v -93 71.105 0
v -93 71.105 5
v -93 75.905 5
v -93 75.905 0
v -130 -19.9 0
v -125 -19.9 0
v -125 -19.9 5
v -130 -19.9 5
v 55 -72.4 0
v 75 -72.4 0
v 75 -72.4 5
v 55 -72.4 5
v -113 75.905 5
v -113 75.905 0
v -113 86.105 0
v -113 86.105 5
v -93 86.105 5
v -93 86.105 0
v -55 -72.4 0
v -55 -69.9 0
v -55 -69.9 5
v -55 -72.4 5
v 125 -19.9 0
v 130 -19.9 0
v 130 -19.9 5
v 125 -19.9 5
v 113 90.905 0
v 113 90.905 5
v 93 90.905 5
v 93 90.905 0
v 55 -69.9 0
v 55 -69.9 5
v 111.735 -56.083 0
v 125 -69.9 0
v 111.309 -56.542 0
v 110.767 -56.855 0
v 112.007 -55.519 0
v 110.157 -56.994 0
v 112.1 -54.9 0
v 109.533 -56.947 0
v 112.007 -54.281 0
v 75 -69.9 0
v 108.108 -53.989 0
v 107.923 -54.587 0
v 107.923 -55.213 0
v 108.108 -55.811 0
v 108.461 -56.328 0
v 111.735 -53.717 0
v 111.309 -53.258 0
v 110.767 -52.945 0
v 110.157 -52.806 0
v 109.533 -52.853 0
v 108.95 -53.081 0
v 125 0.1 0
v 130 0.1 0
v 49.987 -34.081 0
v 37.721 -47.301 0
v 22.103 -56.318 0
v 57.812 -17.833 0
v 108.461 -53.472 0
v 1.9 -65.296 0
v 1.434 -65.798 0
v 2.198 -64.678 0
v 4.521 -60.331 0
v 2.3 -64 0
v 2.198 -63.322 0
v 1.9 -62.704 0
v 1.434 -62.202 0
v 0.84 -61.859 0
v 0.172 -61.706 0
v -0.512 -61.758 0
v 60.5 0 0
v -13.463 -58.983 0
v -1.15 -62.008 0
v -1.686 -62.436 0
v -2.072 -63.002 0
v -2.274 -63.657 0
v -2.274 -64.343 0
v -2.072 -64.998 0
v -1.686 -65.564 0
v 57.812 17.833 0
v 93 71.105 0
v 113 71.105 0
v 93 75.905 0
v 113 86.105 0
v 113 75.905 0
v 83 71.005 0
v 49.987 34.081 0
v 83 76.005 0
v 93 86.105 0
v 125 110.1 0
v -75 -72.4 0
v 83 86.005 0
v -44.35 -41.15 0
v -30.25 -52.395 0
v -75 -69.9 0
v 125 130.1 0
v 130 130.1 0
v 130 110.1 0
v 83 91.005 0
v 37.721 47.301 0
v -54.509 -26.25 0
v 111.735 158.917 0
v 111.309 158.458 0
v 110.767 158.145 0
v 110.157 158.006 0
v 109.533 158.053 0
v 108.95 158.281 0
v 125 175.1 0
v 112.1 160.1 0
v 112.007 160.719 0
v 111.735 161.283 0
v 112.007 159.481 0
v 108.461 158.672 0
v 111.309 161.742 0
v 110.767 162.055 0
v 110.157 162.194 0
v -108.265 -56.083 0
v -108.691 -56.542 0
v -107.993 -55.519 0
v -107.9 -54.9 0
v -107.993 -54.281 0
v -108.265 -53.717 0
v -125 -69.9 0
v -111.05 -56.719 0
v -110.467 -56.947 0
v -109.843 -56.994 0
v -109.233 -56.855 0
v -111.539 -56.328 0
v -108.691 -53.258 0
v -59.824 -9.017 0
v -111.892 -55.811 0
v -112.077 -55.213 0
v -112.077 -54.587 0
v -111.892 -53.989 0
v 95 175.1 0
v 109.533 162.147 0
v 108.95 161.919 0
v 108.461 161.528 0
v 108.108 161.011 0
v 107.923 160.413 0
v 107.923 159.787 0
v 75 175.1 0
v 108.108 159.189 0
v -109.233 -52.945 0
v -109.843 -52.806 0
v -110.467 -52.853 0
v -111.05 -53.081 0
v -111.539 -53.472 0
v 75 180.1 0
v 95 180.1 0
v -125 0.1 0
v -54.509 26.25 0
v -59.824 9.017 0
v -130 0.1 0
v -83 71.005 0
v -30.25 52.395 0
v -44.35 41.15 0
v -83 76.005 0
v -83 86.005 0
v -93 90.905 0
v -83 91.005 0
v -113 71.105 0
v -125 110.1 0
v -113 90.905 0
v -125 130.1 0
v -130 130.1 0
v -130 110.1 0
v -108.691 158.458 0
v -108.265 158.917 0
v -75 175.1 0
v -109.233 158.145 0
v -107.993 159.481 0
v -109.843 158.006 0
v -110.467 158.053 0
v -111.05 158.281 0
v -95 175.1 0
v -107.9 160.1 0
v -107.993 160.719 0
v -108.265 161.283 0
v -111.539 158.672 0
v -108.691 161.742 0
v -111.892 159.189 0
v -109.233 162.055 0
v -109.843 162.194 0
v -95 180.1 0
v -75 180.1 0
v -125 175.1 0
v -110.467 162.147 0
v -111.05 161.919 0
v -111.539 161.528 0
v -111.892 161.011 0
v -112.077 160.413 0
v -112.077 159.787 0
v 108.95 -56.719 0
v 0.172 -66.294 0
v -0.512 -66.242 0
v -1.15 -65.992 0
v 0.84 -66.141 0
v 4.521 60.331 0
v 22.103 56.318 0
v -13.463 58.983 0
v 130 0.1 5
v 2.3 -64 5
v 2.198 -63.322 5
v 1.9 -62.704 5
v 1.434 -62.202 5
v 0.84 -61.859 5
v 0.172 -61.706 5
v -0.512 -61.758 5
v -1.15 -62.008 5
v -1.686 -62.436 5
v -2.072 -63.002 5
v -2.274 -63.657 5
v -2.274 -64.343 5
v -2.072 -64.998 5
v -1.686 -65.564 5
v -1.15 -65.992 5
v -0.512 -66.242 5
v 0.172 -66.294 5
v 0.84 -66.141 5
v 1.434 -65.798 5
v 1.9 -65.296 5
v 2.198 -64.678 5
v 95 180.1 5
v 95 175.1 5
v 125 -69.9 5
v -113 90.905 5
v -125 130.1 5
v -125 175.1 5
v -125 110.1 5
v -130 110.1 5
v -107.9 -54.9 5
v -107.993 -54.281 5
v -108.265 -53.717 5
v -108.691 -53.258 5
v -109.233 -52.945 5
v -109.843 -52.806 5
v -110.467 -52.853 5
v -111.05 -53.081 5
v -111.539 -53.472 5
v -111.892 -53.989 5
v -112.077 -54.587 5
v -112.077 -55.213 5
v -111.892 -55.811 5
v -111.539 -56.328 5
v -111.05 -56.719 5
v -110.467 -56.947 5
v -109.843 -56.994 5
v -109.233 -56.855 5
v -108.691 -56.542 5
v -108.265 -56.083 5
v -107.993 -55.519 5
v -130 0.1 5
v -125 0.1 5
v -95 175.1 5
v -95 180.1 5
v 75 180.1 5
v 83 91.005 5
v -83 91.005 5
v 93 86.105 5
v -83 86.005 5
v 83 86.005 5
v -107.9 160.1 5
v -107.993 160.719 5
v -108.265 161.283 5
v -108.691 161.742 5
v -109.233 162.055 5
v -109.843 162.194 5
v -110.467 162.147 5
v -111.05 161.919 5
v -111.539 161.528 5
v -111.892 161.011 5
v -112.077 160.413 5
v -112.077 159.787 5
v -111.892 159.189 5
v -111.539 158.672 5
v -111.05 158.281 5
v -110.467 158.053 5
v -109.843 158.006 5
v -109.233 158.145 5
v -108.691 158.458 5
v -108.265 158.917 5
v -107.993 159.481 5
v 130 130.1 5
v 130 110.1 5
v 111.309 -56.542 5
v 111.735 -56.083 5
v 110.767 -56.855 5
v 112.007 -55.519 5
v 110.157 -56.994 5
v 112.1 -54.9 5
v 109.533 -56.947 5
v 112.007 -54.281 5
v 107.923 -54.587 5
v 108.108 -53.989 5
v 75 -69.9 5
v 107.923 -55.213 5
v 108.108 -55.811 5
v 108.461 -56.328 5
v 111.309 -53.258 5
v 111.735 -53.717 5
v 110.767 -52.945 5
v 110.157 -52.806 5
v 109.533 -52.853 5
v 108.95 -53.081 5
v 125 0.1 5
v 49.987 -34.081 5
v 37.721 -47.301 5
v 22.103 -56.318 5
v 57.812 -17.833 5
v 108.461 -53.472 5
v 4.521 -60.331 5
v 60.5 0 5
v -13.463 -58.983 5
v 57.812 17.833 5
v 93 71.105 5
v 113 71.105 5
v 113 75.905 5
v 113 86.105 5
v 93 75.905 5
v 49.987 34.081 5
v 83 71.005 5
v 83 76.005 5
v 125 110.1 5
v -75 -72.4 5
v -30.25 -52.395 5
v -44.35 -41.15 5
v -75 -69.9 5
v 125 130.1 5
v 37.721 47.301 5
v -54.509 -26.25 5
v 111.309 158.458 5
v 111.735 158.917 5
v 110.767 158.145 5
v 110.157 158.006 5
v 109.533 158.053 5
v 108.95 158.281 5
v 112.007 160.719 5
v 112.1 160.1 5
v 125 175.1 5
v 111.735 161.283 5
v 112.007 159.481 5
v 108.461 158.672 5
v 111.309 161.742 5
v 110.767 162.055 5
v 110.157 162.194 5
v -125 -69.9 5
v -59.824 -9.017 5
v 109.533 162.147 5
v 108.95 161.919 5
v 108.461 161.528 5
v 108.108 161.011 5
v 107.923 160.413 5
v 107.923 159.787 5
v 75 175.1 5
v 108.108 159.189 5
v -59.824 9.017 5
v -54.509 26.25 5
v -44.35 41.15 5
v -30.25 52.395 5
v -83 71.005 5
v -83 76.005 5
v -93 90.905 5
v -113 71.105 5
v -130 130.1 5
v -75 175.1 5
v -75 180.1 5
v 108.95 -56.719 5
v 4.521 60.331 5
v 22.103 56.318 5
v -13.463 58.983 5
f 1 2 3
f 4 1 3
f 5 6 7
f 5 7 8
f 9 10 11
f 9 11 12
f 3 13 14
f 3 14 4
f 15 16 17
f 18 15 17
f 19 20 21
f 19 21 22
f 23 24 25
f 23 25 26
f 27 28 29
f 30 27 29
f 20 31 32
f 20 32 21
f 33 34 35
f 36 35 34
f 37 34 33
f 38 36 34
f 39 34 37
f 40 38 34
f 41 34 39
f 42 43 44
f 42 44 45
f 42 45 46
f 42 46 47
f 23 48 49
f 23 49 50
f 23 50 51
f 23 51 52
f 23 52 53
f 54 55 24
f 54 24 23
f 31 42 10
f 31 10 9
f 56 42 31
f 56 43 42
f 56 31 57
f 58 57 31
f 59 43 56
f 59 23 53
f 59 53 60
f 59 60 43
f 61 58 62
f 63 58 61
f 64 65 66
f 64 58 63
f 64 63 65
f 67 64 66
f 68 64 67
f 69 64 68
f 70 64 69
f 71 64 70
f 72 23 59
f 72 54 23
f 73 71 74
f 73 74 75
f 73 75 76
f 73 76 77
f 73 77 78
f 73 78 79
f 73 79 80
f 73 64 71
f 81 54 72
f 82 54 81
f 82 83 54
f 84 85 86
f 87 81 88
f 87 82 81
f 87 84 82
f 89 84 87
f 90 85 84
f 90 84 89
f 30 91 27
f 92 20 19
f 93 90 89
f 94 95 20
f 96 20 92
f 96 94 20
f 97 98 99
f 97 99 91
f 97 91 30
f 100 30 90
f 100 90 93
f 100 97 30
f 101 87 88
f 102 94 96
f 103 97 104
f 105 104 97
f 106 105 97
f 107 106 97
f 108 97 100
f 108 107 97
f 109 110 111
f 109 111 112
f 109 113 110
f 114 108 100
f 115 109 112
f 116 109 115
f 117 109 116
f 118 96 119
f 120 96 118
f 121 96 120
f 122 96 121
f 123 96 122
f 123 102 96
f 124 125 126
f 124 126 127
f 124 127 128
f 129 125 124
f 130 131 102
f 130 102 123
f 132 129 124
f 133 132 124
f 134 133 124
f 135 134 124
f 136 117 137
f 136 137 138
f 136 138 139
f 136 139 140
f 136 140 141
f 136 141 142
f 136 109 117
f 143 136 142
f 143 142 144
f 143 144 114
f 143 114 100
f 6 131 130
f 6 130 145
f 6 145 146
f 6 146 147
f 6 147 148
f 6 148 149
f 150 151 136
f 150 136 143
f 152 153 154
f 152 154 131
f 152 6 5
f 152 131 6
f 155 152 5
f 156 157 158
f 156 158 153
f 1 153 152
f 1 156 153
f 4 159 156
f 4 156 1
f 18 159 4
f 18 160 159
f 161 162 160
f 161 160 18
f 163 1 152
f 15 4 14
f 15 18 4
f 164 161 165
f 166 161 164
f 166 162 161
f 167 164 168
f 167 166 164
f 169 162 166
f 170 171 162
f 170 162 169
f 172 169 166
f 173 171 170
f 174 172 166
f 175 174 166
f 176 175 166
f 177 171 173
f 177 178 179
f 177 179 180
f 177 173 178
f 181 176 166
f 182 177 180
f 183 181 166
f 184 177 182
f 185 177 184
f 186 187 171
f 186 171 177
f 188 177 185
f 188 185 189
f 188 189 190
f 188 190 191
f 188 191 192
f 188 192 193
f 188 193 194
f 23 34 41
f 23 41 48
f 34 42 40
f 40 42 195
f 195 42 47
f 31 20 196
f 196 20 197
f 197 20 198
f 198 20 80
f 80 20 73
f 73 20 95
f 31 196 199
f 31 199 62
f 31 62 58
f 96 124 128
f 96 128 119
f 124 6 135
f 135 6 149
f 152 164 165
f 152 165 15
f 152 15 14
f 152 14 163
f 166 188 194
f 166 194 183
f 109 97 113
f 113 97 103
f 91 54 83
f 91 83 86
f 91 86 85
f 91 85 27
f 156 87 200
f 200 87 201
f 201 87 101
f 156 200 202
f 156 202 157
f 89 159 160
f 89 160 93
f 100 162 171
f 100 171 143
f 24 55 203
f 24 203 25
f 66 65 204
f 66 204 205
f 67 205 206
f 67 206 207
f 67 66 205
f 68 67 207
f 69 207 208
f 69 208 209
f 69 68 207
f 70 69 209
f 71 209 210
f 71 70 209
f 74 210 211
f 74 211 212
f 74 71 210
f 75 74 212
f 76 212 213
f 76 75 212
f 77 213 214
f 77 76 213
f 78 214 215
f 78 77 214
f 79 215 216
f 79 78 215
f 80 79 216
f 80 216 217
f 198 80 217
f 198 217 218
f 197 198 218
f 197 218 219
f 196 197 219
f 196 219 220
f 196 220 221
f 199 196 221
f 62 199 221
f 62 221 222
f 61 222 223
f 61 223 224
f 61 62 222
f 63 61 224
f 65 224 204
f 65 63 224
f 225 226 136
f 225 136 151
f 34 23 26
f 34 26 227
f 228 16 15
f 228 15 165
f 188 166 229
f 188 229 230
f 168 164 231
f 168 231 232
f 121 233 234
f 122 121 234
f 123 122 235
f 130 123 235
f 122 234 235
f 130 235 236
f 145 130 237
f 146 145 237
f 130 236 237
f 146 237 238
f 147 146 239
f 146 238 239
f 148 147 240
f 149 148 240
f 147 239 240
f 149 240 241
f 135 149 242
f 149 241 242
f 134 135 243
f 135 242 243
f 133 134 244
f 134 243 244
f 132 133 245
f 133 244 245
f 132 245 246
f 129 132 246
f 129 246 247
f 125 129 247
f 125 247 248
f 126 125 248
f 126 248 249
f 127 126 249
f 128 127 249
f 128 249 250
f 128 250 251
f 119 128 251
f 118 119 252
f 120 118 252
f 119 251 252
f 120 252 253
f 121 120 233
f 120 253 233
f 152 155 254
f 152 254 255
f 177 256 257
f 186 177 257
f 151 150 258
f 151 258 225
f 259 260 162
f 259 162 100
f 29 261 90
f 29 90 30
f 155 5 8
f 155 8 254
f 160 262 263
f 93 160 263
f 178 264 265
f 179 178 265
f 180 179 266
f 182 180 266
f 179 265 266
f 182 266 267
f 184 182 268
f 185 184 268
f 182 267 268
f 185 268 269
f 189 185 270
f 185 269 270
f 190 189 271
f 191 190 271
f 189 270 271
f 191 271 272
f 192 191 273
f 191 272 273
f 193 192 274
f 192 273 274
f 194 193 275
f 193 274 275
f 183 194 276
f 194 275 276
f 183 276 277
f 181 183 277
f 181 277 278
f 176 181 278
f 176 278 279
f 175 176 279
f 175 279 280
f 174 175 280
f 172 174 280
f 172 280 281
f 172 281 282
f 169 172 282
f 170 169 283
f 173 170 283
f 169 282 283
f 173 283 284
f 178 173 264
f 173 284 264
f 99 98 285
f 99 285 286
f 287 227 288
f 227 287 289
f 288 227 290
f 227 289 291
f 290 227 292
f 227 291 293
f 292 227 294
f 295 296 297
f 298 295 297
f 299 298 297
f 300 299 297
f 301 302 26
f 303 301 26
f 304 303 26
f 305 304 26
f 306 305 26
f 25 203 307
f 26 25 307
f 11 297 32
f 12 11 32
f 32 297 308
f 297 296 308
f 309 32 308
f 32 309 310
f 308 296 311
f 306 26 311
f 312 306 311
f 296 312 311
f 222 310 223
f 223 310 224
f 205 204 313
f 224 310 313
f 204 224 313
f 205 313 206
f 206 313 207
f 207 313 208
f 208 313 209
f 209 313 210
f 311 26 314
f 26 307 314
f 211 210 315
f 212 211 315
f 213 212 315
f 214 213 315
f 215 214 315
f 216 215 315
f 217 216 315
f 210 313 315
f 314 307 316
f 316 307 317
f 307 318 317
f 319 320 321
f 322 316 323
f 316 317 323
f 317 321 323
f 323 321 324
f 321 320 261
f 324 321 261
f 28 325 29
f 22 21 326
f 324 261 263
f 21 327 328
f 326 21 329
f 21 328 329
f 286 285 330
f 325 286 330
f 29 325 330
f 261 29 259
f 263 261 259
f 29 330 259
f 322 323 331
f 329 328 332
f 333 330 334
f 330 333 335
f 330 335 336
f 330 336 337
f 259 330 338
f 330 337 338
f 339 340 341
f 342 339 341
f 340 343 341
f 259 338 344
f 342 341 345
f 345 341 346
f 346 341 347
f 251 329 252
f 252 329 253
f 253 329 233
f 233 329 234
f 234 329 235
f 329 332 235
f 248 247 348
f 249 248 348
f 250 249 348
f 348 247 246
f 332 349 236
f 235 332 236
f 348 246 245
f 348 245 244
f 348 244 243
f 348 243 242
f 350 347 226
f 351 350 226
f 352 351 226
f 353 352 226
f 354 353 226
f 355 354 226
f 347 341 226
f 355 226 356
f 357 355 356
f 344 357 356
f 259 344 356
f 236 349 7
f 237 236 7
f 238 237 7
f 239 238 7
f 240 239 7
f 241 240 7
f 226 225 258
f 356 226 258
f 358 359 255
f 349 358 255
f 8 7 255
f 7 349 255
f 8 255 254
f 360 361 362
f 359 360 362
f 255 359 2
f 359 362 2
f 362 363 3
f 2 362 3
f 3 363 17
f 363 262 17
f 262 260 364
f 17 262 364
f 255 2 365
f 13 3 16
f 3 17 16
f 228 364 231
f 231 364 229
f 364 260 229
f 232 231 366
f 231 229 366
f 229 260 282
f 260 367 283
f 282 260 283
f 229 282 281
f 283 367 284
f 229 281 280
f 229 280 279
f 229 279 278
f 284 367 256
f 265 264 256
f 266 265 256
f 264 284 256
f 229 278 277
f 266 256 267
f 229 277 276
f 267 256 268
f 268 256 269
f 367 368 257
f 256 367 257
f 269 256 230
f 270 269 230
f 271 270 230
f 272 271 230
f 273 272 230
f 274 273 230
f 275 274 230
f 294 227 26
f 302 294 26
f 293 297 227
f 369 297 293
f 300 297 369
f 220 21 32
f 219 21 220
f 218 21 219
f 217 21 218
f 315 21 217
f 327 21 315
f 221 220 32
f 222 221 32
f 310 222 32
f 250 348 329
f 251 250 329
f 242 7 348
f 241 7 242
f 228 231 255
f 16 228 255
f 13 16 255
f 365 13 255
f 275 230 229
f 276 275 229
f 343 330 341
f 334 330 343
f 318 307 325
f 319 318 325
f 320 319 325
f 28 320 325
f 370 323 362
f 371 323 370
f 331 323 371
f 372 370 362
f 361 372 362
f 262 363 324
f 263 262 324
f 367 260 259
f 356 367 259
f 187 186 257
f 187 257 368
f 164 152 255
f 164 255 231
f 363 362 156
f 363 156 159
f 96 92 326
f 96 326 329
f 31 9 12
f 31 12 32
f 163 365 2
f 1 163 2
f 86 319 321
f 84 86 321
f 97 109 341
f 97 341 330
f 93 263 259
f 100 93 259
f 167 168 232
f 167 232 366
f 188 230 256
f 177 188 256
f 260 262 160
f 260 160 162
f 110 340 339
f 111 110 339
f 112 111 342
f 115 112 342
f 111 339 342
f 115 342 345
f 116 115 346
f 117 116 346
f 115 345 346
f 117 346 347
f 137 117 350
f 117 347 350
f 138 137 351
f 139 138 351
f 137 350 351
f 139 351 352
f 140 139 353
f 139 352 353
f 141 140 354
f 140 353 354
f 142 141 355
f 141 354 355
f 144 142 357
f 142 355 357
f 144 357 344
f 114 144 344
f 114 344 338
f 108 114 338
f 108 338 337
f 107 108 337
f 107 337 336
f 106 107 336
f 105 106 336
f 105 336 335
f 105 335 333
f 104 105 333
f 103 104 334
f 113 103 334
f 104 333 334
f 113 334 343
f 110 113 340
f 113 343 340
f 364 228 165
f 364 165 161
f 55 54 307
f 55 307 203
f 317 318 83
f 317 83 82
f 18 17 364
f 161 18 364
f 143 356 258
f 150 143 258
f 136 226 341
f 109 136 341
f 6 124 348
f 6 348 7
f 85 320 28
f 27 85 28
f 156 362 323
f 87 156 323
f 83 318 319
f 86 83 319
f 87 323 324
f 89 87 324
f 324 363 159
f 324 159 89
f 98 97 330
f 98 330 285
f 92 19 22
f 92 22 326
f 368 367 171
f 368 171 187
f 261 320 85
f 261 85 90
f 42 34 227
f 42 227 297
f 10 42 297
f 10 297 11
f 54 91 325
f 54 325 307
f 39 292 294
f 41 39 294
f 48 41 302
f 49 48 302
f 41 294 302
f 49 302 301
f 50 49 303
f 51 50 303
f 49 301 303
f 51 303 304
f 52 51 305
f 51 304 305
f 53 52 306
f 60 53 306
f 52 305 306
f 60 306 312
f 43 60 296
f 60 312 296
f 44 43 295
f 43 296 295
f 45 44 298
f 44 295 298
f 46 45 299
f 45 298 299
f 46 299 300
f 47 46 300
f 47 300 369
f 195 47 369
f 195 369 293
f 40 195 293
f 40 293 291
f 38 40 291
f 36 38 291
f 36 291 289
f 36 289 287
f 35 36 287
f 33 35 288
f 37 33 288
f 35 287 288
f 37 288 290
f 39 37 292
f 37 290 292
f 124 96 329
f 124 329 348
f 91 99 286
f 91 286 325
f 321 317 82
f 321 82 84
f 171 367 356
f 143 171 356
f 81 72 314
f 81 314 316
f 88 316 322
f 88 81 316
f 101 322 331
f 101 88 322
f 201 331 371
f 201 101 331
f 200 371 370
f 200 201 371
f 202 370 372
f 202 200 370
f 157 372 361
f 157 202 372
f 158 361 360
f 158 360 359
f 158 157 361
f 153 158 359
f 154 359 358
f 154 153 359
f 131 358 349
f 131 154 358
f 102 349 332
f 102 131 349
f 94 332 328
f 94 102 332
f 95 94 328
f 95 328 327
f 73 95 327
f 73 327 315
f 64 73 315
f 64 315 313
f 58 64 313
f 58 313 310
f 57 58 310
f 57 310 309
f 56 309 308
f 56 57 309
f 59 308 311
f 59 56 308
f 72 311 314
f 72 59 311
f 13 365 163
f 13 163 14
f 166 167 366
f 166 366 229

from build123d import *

# Parameters (mm, degrees)
SKETCH1_R           = 60.5
SKETCH1_R_2         = 2.3
BOSS_EXTRUDE1_DEPTH = 5
SKETCH3_W           = 20
SKETCH3_H           = 4.8
CUT_EXTRUDE1_DEPTH  = 5
SKETCH4_W           = 165.999999998
SKETCH4_H           = 5
CUT_EXTRUDE2_DEPTH  = 5
SKETCH5_R           = 2.1
CUT_EXTRUDE3_DEPTH  = 5
SKETCH6_W           = 30
SKETCH6_H           = 5
SKETCH6_W_2         = 150
CUT_EXTRUDE4_DEPTH  = 5
SKETCH7_R           = 2.1
CUT_EXTRUDE5_DEPTH  = 5


with BuildPart() as part:
    # Sketch1 → Boss-Extrude1 (new body)
    with BuildSketch(Plane.XY):
        Polygon((125.000000001, -69.9), (75.000000001, -69.9), (75.000000001, -72.4), (55.000000001, -72.4), (55.000000001, -69.9), (-54.999999999, -69.9), (-54.999999999, -72.4), (-74.999999999, -72.4), (-74.999999999, -69.9), (-124.999999999, -69.9), (-124.999999999, -19.9), (-129.999999999, -19.9), (-129.999999999, 0.1), (-124.999999999, 0.1), (-124.999999999, 110.1), (-129.999999999, 110.1), (-129.999999999, 130.1), (-124.999999999, 130.1), (-124.999999999, 180.1), (125.000000001, 180.1), (125.000000001, 130.1), (130.000000001, 130.1), (130.000000001, 110.1), (125.000000001, 110.1), (125.000000001, 0.1), (130.000000001, 0.1), (130.000000001, -19.9), (125.000000001, -19.9), align=None)
        Circle(SKETCH1_R, mode=Mode.SUBTRACT)
        with Locations((0, -64)):
            Circle(SKETCH1_R_2, mode=Mode.SUBTRACT)
    extrude(amount=BOSS_EXTRUDE1_DEPTH)

    # Sketch3 → Cut-Extrude1 (cut)
    with BuildSketch(Plane.XY.offset(5)):
        with Locations((-102.999999999, 88.505234687)):
            Rectangle(SKETCH3_W, SKETCH3_H)
        with Locations((-102.999999999, 73.505234687)):
            Rectangle(SKETCH3_W, SKETCH3_H)
    cut_extrude1 = extrude(amount=-CUT_EXTRUDE1_DEPTH, mode=Mode.SUBTRACT)

    # Mirror1: Cut-Extrude1 across plane
    add(cut_extrude1.mirror(Plane(origin=(0, 0, 0), x_dir=(0, 0, 1), z_dir=(1, 0, 0))), mode=Mode.SUBTRACT)

    # Sketch4 → Cut-Extrude2 (cut)
    with BuildSketch(Plane.XY.offset(5)):
        with Locations((0, 88.505234687)):
            Rectangle(SKETCH4_W, SKETCH4_H)
        with Locations((0, 73.505234687)):
            Rectangle(SKETCH4_W, SKETCH4_H)
    extrude(amount=-CUT_EXTRUDE2_DEPTH, mode=Mode.SUBTRACT)

    # Sketch5 → Cut-Extrude3 (cut)
    with BuildSketch(Plane.XY.offset(5)):
        with Locations((-109.999999999, -54.9)):
            Circle(SKETCH5_R)
        with Locations((110.000000001, -54.9)):
            Circle(SKETCH5_R)
    extrude(amount=-CUT_EXTRUDE3_DEPTH, mode=Mode.SUBTRACT)

    # Sketch6 → Cut-Extrude4 (cut)
    with BuildSketch(Plane.XY.offset(5)):
        with Locations((-109.999999999, 177.6)):
            Rectangle(SKETCH6_W, SKETCH6_H)
        with Locations((1e-09, 177.6)):
            Rectangle(SKETCH6_W_2, SKETCH6_H)
        with Locations((110.000000001, 177.6)):
            Rectangle(SKETCH6_W, SKETCH6_H)
    extrude(amount=-CUT_EXTRUDE4_DEPTH, mode=Mode.SUBTRACT)

    # Sketch7 → Cut-Extrude5 (cut)
    with BuildSketch(Plane.XY.offset(5)):
        with Locations((-109.999999999, 160.1)):
            Circle(SKETCH7_R)
        with Locations((110.000000001, 160.1)):
            Circle(SKETCH7_R)
    extrude(amount=-CUT_EXTRUDE5_DEPTH, mode=Mode.SUBTRACT)


solid = part.part
